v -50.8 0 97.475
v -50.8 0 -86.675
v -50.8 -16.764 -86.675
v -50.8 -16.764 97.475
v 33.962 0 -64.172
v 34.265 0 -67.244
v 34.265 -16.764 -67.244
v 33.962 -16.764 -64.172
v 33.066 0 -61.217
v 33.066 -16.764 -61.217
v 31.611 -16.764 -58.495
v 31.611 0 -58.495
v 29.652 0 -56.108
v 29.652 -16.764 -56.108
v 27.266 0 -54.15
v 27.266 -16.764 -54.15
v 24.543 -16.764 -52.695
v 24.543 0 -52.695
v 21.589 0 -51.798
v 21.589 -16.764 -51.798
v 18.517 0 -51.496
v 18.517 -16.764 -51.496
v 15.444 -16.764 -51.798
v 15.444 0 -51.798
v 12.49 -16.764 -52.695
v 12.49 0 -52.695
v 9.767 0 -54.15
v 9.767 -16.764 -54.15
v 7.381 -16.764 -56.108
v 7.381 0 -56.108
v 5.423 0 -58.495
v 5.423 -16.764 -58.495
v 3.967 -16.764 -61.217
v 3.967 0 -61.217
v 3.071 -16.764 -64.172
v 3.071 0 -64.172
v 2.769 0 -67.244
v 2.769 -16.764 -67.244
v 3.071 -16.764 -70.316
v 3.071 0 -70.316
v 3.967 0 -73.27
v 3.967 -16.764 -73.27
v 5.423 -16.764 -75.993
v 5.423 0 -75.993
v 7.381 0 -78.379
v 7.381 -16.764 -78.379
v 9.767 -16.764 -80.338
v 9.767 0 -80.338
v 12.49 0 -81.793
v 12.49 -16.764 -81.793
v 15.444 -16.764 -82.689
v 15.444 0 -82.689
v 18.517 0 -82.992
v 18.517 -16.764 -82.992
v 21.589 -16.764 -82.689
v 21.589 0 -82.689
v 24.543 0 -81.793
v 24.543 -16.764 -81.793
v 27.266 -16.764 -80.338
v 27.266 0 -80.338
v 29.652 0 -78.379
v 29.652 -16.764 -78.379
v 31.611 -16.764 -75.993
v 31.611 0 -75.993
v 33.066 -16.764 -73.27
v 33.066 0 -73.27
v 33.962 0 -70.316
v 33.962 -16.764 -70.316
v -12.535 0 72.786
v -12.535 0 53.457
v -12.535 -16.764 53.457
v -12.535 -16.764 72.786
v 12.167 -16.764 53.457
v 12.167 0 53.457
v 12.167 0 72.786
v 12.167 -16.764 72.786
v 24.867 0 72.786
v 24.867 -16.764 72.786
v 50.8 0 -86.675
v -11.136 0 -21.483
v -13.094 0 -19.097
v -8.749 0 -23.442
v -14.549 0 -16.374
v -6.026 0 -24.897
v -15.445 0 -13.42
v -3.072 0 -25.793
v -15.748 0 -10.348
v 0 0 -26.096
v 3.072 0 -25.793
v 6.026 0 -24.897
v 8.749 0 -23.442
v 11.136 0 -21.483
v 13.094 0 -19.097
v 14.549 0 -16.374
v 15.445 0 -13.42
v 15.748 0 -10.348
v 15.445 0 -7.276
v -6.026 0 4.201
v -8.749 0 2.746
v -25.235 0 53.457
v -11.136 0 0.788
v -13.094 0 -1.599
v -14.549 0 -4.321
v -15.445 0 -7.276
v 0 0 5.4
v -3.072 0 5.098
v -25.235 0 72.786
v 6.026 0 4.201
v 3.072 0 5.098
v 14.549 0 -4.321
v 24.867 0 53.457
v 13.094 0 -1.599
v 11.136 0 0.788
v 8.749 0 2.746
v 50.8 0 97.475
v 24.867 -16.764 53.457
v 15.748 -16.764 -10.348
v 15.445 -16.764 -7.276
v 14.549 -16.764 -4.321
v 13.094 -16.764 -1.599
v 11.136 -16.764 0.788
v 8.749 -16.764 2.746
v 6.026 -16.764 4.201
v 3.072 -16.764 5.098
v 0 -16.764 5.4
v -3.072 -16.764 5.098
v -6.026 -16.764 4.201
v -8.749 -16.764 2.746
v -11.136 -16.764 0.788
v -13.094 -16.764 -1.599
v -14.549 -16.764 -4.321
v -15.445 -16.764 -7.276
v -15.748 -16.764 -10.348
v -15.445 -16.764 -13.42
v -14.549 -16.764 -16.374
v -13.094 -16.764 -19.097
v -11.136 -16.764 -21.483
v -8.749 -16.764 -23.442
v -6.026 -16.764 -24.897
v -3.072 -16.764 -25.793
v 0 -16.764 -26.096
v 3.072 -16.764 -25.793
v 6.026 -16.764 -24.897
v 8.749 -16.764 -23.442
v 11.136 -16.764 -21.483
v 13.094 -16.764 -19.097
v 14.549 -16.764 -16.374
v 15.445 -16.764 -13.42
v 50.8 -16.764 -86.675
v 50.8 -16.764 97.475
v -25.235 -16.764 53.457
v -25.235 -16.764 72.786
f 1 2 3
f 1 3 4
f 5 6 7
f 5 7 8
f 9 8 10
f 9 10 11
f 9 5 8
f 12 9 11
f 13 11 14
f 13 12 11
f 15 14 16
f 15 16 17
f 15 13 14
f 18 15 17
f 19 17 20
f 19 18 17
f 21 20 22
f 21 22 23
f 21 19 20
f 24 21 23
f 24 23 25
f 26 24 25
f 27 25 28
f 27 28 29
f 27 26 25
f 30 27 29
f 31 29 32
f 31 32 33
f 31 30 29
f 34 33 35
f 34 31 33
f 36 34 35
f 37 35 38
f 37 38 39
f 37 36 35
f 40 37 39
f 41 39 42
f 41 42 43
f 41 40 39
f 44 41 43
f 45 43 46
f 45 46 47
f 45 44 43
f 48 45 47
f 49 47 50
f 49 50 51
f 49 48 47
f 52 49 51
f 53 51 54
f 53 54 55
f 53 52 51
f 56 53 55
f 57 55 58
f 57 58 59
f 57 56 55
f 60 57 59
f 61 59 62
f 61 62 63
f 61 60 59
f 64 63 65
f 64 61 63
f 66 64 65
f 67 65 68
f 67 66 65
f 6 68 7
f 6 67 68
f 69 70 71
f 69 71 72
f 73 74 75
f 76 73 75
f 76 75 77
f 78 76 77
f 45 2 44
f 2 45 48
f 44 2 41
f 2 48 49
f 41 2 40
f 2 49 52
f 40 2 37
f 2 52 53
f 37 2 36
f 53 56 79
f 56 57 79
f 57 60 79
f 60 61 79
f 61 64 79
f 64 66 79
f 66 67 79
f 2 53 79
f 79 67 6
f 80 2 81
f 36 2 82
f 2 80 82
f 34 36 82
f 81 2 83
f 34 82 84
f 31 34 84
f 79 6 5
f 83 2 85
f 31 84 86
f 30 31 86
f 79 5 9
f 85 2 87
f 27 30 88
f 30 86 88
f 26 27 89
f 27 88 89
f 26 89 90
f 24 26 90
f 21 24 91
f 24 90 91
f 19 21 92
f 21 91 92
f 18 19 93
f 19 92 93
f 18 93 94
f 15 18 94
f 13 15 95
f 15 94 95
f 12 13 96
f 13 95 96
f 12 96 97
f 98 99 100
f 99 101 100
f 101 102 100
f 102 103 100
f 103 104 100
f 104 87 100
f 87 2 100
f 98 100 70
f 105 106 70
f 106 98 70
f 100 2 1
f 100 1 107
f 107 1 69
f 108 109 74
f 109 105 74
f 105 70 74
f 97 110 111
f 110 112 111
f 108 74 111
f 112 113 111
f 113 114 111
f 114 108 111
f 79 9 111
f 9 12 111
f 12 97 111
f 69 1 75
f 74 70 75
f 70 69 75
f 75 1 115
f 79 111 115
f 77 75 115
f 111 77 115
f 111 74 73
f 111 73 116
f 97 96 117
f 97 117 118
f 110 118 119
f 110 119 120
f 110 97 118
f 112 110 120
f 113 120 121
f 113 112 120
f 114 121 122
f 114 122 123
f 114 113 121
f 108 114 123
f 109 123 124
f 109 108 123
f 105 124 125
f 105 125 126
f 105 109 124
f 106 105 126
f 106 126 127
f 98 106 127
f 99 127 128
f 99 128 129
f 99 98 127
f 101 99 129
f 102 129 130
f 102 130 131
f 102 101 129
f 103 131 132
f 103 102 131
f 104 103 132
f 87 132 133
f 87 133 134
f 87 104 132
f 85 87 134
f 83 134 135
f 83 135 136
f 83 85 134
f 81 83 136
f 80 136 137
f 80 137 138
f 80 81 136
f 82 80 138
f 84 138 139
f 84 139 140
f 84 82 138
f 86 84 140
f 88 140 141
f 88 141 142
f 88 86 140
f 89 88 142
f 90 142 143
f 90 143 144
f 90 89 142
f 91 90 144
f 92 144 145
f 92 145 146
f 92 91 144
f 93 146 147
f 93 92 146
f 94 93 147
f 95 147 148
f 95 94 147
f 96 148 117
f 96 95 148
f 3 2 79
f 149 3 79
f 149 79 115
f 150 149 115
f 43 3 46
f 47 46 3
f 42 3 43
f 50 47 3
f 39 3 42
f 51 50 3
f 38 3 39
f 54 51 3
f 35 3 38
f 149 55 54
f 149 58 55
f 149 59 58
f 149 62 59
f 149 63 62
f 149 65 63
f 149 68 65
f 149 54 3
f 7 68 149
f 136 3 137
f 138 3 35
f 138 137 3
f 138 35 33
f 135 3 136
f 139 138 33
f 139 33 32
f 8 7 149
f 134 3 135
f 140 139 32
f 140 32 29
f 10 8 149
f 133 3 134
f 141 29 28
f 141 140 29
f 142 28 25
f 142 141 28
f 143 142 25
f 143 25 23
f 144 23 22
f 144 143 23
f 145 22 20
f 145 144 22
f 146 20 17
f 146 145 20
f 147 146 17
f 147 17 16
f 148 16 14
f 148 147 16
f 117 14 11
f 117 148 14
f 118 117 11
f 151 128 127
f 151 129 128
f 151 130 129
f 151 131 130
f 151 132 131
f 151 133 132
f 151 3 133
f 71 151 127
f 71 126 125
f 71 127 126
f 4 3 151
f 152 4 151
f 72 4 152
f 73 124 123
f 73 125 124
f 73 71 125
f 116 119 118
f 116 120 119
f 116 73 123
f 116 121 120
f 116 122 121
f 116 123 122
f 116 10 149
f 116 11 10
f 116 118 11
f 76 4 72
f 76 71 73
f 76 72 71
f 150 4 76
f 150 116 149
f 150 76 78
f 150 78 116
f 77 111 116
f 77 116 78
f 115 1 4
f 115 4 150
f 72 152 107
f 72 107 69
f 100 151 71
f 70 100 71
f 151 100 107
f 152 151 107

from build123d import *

# Parameters (mm, degrees)
F0_W     = 101.6
F0_H     = 184.15
F0_R     = 15.748
F0_W_2   = 12.7
F0_H_2   = 19.3294
F1_DEPTH = 16.764


with BuildPart() as f1:
    # F0 (on Front) → F1 (new body)
    with BuildSketch(Plane.XZ):
        with Locations((0, 5.400208)):
            Rectangle(F0_W, F0_H)
        with Locations((0, -10.347792)):
            Circle(F0_R, mode=Mode.SUBTRACT)
        with Locations((18.5166, -67.243792)):
            Circle(F0_R, mode=Mode.SUBTRACT)
        with Locations((-18.8849, 63.121708)):
            Rectangle(F0_W_2, F0_H_2, mode=Mode.SUBTRACT)
        with Locations((18.5166, 63.121708)):
            Rectangle(F0_W_2, F0_H_2, mode=Mode.SUBTRACT)
    extrude(amount=F1_DEPTH)


solid = f1.part
